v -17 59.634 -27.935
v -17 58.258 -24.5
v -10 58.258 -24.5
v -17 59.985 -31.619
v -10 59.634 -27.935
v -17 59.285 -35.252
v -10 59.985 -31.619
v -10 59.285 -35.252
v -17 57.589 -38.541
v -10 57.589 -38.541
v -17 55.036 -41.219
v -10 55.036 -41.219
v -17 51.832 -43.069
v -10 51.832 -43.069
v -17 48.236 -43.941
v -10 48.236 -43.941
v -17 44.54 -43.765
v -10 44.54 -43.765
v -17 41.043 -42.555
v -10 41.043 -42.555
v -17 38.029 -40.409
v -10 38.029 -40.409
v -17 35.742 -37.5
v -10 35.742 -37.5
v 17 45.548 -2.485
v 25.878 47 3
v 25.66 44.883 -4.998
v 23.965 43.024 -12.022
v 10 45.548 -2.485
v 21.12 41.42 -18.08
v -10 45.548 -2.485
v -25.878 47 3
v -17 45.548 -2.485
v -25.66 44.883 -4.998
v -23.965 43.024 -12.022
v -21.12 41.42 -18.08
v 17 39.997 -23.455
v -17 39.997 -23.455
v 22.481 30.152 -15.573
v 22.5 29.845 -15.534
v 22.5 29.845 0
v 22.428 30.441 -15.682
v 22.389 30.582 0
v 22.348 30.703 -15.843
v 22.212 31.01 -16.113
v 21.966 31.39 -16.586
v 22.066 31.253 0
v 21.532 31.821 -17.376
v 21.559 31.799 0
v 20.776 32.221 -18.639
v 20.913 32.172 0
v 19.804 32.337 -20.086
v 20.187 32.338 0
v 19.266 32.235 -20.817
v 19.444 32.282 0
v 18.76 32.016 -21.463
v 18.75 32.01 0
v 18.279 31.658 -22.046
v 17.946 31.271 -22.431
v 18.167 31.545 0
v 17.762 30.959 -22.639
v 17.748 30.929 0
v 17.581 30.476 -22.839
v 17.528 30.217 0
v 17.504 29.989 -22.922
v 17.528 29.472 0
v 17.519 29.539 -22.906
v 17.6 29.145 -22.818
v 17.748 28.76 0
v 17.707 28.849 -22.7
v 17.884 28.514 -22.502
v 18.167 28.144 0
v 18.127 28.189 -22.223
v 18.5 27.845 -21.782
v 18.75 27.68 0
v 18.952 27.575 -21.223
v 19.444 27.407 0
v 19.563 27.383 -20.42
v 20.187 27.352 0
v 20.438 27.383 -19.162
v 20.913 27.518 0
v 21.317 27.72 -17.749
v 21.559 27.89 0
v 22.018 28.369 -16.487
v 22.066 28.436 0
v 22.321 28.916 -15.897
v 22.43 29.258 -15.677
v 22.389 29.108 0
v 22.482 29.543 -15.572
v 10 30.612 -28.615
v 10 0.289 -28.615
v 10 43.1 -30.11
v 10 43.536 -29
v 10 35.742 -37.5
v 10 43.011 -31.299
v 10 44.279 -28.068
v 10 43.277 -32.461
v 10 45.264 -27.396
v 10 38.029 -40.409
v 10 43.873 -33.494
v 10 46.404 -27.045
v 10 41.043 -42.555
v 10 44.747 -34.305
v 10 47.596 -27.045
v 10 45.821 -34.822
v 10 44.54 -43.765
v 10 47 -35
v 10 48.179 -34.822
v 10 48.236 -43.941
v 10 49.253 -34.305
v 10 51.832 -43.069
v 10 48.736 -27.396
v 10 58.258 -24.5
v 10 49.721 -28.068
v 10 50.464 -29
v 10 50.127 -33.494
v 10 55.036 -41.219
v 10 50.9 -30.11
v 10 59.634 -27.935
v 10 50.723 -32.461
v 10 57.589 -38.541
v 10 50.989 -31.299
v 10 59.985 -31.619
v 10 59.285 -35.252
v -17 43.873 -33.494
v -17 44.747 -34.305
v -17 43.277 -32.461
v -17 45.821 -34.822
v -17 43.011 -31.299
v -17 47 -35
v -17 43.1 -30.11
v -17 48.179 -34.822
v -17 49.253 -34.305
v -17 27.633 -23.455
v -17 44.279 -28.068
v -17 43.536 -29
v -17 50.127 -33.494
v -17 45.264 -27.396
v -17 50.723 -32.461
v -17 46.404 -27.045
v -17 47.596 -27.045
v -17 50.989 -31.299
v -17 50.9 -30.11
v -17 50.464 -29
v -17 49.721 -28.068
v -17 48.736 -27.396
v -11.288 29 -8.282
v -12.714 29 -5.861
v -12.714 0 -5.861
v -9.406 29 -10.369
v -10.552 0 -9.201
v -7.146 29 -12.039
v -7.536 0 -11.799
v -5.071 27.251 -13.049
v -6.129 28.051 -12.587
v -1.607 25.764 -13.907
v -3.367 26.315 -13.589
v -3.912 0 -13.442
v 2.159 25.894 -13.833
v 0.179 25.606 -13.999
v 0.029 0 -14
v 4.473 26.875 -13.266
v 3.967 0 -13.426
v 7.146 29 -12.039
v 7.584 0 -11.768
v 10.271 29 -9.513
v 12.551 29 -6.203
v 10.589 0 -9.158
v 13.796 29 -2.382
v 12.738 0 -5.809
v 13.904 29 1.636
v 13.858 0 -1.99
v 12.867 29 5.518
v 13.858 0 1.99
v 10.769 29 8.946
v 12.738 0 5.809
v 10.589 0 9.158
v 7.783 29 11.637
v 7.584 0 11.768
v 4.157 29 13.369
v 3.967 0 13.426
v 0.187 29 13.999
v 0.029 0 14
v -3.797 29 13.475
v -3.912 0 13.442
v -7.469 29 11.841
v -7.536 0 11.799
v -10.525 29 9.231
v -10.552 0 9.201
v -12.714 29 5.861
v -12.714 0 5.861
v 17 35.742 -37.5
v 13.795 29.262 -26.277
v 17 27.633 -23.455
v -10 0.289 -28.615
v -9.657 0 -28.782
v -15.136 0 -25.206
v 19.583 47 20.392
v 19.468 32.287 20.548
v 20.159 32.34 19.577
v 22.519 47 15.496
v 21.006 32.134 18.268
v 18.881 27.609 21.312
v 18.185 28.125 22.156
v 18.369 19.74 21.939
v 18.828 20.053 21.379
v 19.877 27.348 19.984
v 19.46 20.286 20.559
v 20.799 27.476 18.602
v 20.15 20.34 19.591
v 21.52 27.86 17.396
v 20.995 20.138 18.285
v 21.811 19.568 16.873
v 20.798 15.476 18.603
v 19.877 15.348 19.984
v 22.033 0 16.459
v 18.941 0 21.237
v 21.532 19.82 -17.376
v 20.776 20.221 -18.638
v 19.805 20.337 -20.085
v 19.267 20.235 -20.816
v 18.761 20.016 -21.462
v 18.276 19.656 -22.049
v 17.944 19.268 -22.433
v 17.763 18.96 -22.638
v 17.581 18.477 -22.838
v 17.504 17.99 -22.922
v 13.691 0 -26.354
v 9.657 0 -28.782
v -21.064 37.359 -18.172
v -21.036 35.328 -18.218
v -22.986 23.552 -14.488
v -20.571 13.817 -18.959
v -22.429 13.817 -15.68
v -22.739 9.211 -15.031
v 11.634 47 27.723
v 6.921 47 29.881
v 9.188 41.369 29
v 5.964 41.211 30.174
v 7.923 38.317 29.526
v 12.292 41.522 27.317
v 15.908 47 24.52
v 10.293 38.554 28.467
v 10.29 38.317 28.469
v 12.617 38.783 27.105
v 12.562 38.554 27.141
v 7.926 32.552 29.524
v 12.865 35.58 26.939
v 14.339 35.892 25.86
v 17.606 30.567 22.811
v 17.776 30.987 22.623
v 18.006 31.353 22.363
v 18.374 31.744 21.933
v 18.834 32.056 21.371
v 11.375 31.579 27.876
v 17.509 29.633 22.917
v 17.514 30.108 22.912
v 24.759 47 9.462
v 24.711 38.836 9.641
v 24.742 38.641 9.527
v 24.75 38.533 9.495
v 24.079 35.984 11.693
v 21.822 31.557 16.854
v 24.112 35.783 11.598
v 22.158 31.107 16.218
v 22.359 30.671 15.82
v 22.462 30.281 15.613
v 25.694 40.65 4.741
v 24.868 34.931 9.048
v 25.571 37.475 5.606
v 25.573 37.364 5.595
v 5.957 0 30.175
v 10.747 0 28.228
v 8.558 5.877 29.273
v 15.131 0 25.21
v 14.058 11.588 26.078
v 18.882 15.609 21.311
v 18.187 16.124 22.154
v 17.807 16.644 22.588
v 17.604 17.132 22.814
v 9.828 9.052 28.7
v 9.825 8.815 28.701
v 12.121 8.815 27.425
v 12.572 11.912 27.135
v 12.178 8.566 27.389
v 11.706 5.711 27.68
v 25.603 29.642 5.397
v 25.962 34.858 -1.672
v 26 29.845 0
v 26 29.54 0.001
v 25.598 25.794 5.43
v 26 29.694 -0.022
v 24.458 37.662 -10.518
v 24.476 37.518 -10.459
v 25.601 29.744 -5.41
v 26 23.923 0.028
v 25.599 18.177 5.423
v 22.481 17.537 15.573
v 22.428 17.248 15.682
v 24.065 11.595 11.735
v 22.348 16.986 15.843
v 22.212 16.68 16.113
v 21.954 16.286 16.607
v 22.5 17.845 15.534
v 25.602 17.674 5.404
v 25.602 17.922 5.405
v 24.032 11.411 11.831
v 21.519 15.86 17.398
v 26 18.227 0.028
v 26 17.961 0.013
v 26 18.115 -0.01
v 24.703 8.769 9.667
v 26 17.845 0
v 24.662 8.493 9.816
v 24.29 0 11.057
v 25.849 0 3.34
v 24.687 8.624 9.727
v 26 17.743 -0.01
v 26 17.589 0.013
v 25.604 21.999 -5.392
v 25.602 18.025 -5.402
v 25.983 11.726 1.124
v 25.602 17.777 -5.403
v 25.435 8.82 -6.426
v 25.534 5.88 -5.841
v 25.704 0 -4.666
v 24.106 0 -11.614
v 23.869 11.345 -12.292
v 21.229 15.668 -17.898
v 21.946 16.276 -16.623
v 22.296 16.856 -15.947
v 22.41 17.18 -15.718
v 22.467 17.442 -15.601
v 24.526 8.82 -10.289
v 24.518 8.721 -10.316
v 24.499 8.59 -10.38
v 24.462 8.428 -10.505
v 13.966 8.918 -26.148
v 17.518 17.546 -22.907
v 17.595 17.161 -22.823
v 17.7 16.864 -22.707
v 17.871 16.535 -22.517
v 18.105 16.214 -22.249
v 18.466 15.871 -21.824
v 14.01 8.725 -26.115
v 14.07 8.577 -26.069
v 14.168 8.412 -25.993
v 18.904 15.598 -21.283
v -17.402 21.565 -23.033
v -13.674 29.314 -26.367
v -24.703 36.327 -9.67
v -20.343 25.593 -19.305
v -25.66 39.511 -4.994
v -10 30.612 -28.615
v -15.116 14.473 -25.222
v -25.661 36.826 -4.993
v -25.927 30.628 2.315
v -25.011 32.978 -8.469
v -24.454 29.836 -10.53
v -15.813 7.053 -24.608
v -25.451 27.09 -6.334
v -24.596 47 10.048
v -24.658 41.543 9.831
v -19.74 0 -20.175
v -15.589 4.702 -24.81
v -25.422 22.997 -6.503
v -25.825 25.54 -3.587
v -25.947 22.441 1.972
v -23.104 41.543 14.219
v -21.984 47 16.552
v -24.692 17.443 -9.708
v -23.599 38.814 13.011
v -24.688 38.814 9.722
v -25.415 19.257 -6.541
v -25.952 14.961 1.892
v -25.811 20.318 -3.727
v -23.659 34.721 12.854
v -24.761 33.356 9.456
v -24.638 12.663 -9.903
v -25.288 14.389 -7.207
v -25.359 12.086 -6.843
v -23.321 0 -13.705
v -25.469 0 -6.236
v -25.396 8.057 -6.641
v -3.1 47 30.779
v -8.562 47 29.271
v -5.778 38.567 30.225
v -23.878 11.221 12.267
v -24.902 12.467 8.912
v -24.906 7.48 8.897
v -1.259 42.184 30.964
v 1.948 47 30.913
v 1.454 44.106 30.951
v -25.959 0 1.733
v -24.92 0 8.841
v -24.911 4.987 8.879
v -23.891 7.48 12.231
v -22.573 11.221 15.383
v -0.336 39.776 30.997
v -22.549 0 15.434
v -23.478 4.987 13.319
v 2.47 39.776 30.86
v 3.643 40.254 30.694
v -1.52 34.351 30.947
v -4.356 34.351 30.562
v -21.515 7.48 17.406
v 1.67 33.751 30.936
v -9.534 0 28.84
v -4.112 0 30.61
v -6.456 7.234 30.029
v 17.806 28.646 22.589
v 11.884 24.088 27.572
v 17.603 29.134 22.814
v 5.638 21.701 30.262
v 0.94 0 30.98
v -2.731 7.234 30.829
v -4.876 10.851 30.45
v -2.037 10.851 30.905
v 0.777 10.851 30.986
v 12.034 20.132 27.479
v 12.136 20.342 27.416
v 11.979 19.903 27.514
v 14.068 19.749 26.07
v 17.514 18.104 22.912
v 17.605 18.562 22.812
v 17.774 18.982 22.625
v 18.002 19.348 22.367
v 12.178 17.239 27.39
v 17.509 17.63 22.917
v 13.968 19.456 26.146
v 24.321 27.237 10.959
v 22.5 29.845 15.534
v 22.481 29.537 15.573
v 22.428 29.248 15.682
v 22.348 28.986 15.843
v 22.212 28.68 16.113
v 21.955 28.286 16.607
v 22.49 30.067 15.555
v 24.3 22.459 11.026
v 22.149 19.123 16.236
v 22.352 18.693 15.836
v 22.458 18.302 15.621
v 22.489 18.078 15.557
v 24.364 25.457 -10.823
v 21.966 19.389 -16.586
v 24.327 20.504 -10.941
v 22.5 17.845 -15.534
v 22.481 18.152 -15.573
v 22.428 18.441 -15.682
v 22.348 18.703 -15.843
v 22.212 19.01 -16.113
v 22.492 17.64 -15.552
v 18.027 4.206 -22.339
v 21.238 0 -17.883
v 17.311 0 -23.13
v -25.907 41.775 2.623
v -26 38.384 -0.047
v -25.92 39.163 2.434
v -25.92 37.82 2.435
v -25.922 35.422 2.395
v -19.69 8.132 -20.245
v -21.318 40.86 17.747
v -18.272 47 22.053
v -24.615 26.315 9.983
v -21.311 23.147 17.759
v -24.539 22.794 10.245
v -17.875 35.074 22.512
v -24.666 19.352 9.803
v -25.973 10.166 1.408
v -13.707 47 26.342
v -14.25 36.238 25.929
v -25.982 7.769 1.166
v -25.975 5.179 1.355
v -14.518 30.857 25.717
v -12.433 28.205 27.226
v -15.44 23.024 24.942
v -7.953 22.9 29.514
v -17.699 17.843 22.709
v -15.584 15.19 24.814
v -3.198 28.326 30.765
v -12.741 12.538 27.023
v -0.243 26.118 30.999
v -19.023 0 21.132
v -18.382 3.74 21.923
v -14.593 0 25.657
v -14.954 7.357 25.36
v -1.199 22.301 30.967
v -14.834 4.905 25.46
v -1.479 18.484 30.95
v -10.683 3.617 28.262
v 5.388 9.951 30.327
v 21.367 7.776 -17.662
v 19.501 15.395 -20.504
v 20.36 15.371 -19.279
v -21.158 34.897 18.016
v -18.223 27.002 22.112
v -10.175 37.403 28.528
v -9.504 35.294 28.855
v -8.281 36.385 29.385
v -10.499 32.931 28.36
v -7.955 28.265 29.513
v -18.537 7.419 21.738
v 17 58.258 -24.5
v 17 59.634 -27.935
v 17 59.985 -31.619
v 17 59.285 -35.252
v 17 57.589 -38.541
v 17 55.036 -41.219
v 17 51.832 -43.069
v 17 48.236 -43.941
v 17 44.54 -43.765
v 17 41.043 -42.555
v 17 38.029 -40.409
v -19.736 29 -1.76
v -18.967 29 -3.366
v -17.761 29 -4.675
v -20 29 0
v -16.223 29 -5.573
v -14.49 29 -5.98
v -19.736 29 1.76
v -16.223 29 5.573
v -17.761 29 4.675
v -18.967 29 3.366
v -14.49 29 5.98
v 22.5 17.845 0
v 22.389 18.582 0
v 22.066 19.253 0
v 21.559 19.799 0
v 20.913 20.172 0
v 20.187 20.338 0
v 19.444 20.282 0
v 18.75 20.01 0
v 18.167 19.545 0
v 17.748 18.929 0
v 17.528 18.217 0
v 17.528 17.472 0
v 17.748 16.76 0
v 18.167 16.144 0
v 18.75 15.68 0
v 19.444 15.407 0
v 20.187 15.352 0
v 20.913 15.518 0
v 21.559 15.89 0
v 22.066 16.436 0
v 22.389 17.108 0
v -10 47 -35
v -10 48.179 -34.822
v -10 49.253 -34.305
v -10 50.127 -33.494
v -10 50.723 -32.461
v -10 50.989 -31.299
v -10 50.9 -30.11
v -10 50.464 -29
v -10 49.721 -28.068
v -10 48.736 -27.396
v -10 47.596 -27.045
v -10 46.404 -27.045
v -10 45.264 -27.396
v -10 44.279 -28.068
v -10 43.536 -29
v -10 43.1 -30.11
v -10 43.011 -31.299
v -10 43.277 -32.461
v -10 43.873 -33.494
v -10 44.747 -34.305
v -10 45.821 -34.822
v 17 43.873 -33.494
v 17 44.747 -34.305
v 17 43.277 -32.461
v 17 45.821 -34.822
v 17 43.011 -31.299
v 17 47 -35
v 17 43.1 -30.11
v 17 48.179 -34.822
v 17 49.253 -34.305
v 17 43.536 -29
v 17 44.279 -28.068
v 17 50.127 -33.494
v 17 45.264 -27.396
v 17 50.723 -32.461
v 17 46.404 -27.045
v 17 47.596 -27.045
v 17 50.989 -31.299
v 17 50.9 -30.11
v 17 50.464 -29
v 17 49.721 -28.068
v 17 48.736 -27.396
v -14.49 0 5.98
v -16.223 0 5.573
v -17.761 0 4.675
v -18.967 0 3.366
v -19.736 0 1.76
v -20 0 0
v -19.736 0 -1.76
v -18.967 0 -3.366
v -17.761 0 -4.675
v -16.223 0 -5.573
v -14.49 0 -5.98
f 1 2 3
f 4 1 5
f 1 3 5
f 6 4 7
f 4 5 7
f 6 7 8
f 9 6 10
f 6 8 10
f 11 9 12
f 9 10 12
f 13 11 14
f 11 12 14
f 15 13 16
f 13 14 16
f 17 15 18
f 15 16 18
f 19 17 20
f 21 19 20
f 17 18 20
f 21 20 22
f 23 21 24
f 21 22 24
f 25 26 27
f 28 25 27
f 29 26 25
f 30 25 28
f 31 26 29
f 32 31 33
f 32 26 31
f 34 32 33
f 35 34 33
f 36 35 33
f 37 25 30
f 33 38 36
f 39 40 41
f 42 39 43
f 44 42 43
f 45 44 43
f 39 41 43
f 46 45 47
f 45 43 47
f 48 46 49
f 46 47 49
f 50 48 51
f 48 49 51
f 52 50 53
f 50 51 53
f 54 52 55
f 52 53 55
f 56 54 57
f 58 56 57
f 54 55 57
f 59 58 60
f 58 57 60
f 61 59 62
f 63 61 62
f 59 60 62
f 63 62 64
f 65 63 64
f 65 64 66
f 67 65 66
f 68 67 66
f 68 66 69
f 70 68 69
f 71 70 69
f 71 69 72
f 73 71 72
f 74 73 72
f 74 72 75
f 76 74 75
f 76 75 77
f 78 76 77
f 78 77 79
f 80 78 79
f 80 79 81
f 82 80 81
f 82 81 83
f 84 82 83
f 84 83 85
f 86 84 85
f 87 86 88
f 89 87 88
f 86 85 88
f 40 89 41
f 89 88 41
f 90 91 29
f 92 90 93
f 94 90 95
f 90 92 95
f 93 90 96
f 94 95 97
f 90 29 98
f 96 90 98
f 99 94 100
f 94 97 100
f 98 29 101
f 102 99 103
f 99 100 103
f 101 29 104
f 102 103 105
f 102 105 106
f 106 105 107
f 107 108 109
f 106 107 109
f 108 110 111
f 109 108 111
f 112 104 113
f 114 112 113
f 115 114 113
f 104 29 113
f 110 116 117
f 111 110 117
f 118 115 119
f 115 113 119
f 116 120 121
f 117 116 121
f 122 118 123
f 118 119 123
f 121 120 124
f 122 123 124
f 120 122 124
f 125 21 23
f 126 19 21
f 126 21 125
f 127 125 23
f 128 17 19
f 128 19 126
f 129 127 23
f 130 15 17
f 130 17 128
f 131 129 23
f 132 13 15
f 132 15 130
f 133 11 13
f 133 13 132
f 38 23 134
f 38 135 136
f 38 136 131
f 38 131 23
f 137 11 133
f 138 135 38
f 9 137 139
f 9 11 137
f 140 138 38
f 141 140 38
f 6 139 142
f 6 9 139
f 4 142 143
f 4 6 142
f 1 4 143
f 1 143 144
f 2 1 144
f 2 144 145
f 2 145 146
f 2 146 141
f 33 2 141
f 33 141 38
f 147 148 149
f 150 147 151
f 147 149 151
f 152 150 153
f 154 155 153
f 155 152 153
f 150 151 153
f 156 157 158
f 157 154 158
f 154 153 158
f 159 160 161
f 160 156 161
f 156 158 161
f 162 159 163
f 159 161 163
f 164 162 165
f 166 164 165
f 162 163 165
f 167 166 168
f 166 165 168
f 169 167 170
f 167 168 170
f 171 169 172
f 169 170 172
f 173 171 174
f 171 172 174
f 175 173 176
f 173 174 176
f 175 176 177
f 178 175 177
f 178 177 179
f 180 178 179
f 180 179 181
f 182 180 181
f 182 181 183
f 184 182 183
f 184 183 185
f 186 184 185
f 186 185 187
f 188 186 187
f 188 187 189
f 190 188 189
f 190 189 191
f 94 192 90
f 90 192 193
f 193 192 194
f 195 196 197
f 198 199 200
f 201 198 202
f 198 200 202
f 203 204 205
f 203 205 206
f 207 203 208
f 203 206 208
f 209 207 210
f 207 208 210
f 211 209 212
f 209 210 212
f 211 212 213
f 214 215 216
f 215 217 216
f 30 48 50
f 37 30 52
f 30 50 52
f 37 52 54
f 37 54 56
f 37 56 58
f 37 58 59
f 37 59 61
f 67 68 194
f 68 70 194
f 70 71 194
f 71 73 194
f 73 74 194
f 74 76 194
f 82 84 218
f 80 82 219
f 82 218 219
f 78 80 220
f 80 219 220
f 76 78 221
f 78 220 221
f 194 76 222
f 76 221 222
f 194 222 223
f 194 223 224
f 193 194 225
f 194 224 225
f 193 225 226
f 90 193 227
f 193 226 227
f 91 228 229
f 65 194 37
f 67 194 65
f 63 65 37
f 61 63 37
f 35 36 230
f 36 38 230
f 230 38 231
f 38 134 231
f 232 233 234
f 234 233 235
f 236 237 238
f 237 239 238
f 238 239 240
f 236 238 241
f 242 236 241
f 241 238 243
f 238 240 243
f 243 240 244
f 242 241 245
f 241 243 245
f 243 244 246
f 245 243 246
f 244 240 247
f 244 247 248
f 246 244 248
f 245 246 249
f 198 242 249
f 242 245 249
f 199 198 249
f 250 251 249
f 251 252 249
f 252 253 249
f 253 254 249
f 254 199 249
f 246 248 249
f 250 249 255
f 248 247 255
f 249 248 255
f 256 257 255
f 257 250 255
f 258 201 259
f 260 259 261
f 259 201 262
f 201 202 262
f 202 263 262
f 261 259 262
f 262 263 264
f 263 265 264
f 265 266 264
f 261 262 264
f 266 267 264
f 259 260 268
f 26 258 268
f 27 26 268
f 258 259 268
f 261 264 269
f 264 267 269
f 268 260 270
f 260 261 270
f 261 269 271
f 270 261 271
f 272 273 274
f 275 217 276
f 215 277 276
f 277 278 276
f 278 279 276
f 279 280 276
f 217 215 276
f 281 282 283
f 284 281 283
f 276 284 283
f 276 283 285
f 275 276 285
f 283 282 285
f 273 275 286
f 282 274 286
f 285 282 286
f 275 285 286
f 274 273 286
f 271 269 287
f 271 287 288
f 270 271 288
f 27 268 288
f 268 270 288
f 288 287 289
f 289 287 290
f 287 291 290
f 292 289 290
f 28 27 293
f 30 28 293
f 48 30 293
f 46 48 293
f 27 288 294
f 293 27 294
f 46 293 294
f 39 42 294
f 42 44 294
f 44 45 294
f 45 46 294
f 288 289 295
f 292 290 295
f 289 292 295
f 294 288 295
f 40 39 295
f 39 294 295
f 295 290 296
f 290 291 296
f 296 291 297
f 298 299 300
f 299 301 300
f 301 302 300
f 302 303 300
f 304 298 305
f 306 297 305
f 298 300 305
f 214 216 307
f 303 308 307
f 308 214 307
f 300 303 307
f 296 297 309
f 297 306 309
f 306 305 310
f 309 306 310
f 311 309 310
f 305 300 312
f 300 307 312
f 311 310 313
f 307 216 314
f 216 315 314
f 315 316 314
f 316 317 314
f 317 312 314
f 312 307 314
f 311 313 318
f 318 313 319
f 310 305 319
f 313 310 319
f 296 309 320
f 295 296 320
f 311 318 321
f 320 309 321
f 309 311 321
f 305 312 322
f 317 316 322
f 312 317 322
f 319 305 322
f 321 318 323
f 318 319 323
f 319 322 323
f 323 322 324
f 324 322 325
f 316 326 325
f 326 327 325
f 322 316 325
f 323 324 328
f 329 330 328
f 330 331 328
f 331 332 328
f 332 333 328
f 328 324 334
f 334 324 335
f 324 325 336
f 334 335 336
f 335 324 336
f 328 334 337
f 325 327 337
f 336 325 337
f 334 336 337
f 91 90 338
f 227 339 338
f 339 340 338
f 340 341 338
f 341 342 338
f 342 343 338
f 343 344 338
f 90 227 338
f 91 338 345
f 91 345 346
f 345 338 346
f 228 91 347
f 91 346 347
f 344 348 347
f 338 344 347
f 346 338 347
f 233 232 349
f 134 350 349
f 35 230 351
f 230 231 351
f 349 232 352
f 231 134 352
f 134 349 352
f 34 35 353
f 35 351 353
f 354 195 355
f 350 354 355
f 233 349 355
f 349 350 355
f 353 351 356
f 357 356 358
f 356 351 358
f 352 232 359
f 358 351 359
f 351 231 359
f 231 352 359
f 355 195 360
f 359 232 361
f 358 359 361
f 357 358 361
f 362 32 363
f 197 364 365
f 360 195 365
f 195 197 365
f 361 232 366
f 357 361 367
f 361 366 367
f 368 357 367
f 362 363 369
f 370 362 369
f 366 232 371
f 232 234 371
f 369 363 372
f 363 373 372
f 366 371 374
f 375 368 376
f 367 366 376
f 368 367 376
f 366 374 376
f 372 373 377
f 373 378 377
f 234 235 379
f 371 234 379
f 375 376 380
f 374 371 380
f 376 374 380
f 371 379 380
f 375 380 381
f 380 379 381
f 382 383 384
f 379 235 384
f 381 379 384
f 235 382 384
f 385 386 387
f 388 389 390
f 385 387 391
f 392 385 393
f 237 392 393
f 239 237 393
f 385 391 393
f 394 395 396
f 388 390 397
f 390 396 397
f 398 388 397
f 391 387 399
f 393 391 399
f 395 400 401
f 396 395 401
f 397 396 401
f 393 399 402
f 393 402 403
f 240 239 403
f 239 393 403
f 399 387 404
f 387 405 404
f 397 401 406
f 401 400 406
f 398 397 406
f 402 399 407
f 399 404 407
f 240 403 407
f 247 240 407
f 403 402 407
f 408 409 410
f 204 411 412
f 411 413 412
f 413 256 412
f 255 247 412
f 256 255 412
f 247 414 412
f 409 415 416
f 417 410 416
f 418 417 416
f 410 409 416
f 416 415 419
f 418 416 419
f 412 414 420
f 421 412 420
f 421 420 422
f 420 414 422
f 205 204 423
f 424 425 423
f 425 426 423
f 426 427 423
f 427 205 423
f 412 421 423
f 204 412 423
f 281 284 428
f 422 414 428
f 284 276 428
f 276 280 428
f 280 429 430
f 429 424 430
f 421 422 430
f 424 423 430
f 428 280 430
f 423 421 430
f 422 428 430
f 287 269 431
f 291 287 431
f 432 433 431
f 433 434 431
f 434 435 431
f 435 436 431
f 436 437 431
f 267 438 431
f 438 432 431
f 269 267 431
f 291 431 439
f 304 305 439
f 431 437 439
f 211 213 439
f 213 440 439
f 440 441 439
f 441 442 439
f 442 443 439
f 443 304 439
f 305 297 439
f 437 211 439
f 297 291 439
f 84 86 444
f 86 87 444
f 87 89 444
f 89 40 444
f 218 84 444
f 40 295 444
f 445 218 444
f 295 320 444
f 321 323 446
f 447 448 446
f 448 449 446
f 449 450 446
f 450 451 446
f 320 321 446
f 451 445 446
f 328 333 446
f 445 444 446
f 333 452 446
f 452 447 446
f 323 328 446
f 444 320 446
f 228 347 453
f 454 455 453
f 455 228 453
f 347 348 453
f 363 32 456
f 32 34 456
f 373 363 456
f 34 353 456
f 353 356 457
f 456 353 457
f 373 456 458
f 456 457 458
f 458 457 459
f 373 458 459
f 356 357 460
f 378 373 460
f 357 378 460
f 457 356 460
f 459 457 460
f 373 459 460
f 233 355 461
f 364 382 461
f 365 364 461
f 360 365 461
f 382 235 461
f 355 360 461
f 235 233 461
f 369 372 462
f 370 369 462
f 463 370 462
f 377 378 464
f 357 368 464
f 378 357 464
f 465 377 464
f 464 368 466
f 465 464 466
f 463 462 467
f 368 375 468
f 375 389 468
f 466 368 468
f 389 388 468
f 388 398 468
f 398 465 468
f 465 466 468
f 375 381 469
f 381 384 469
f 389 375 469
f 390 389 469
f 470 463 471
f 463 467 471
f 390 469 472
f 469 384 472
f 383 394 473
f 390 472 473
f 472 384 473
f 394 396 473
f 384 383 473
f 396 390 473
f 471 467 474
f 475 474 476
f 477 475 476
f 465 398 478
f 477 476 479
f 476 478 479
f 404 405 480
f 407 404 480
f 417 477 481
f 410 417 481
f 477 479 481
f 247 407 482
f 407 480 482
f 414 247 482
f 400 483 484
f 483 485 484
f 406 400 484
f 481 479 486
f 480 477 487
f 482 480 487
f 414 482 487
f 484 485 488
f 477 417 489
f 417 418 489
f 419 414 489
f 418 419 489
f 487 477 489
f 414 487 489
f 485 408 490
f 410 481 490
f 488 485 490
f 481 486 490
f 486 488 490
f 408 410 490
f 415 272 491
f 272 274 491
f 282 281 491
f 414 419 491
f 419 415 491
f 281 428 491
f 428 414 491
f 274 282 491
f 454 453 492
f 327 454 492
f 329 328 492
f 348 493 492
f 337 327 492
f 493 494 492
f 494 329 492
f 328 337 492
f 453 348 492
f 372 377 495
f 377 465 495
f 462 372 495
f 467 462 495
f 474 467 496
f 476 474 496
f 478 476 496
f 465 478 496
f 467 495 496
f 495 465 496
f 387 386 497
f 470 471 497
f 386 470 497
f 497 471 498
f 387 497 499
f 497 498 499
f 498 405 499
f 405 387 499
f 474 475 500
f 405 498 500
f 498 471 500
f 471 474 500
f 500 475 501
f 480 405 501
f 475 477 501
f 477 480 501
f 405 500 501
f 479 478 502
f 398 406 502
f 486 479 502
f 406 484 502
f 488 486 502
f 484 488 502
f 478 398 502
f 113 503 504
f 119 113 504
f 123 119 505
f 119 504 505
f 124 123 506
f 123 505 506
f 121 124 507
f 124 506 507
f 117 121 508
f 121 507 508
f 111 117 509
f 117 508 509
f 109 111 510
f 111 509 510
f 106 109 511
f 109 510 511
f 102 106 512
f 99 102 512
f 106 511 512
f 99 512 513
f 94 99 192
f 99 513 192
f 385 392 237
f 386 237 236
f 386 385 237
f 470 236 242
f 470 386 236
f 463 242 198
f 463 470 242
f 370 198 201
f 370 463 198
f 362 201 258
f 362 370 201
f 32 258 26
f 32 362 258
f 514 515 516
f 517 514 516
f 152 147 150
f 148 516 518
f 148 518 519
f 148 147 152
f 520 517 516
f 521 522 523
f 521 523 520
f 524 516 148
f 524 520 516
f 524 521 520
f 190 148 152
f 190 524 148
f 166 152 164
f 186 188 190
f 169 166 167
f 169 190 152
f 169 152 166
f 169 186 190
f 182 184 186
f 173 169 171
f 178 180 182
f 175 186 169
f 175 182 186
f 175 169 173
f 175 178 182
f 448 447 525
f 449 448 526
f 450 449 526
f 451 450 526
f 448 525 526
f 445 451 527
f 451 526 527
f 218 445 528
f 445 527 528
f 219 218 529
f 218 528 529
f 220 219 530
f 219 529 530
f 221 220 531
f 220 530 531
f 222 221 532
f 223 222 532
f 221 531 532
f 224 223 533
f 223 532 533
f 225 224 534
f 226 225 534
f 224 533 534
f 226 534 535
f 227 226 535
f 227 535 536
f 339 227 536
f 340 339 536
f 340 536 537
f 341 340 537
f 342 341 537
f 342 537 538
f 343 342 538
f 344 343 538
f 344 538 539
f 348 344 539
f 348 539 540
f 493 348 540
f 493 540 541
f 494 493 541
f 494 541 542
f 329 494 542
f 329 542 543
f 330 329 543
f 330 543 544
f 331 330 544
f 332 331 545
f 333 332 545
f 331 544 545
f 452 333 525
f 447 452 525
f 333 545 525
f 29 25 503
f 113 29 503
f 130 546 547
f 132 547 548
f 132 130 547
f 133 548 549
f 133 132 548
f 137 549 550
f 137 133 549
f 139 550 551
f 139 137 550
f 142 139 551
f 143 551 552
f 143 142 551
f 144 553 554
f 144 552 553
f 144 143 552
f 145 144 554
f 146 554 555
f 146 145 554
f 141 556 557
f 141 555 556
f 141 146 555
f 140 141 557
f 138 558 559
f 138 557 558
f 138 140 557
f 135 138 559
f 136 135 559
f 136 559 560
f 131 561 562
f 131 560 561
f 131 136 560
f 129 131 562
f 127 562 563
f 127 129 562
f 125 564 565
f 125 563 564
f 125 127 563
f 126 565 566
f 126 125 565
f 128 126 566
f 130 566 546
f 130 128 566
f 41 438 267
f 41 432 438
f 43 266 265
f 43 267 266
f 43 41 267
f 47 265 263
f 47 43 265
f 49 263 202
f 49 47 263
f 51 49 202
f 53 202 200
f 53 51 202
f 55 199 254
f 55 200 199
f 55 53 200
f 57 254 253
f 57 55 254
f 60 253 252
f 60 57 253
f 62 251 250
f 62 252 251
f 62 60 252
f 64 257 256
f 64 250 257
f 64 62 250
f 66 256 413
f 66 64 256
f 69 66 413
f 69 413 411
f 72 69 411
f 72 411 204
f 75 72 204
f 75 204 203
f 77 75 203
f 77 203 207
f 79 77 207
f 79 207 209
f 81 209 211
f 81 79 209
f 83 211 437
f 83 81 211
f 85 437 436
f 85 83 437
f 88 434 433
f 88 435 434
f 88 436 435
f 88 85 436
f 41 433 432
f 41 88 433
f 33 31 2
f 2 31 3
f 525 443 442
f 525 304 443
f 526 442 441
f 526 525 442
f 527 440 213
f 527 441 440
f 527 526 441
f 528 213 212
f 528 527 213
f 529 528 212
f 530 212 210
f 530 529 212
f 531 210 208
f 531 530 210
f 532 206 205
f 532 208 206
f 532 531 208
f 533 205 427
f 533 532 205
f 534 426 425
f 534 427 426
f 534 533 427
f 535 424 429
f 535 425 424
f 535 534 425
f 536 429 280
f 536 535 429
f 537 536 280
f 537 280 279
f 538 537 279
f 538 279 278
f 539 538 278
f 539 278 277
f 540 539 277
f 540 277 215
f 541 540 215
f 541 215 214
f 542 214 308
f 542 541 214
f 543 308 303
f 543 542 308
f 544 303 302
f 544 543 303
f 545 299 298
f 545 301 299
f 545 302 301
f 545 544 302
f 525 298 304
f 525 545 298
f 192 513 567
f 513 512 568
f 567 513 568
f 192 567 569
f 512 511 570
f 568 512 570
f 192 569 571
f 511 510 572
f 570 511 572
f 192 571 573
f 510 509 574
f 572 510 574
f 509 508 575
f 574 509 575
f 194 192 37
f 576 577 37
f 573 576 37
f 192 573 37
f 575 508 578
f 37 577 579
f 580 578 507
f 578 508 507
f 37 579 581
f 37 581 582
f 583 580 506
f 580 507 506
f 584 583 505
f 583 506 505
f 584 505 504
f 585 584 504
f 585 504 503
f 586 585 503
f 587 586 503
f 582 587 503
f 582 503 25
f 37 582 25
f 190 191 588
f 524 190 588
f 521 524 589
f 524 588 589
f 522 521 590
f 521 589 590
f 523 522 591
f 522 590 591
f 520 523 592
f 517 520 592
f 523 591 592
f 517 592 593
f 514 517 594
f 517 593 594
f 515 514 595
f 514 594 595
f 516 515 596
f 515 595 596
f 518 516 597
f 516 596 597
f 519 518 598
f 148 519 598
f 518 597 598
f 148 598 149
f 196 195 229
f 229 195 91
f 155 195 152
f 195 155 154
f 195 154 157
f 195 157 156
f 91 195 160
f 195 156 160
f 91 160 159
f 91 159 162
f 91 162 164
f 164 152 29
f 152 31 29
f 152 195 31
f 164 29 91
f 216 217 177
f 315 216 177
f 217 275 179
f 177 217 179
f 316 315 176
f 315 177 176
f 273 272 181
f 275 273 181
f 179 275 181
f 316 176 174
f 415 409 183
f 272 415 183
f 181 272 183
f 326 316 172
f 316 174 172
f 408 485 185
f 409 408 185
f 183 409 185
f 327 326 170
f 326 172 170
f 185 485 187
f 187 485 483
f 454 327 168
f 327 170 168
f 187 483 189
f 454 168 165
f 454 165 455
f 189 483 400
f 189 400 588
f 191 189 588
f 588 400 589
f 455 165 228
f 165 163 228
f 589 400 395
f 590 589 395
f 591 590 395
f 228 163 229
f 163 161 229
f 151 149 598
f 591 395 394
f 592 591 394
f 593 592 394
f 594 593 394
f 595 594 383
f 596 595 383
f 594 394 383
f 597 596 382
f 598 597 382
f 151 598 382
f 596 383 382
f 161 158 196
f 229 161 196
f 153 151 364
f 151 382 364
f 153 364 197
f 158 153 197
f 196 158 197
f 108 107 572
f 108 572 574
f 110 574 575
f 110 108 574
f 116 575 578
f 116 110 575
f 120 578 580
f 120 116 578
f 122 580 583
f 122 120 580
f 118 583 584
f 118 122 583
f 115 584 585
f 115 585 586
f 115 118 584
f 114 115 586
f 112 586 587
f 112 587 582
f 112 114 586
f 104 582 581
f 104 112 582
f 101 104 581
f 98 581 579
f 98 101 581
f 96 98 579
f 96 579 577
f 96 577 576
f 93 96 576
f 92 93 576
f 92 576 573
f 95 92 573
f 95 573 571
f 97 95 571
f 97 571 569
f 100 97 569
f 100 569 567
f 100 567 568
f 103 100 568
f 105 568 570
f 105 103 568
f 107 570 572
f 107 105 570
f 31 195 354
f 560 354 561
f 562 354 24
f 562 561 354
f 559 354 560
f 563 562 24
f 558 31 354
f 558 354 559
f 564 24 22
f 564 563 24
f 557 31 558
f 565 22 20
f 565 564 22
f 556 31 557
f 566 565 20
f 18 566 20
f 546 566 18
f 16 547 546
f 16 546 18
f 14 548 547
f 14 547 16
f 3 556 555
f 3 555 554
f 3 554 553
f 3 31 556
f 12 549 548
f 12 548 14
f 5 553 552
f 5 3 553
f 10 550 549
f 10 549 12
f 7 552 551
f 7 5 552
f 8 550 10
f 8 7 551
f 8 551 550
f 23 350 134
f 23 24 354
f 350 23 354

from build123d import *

# Parameters (mm, degrees)
SKETCH2_RX              = 31
SKETCH2_RY              = 26
BOSS_EXTRUDE1_DEPTH     = 47
CUT_EXTRUDE1_DEPTH      = 29
CUT_EXTRUDE2_DEPTH      = 27
CUT_EXTRUDE2_DEPTH_BACK = 27
SKETCH5_R               = 4
BOSS_EXTRUDE2_DEPTH     = 17
SKETCH6_W               = 20
SKETCH6_H               = 38.42056209
CUT_EXTRUDE3_DEPTH      = 61.203194114
SKETCH7_R               = 2.5
CUT_EXTRUDE4_DEPTH      = 32.0000001
CUT_EXTRUDE4_DEPTH_BACK = 45.0000001


with BuildPart() as part:
    # Sketch2 → Boss-Extrude1 (new body)
    with BuildSketch(Plane(origin=(0, 0, 0), x_dir=(1, 0, 0), z_dir=(0, 1, 0))):
        with Locations(Location((0, 0), (0, 0, 90))):
            Ellipse(SKETCH2_RX, SKETCH2_RY)
    extrude(amount=BOSS_EXTRUDE1_DEPTH)

    # Sketch3 → Cut-Extrude1 (cut)
    with BuildSketch(Plane.XZ):
        with BuildLine():
            ThreePointArc((-12.714285714, -5.860626142), (14, 0), (-12.714285714, 5.860626142))
            ThreePointArc((-12.714285714, 5.860626142), (-20, 0), (-12.714285714, -5.860626142))
        make_face()
    extrude(amount=-CUT_EXTRUDE1_DEPTH, mode=Mode.SUBTRACT)

    # Sketch4 → Cut-Extrude2 (cut, two sides)
    with BuildSketch(Plane(origin=(0, 0, 0), x_dir=(0, 0, -1), z_dir=(1, 0, 0))) as cut_extrude2_sk:
        Polygon((-3, 47), (31, 38), (31, 47), align=None)
    extrude(amount=CUT_EXTRUDE2_DEPTH, mode=Mode.SUBTRACT)
    extrude(cut_extrude2_sk.sketch, amount=-CUT_EXTRUDE2_DEPTH_BACK, mode=Mode.SUBTRACT)

    # Sketch5 → Boss-Extrude2 (add, symmetric)
    with BuildSketch(Plane(origin=(0, 0, 0), x_dir=(0, 0, -1), z_dir=(1, 0, 0))):
        with BuildLine():
            Line((2.485147451, 45.548049204), (24.5, 58.258330249))
            ThreePointArc((24.5, 58.258330249), (42.258330249, 53.5), (37.5, 35.741669751))
            Line((37.5, 35.741669751), (15.485147451, 23.031388706))
            Line((15.485147451, 23.031388706), (2.485147451, 45.548049204))
        make_face()
        with Locations((31, 47)):
            Circle(SKETCH5_R, mode=Mode.SUBTRACT)
    extrude(amount=BOSS_EXTRUDE2_DEPTH, both=True)

    # Sketch6 → Cut-Extrude3 (cut, through all)
    with BuildSketch(Plane(origin=(0, 33.084936491, 19.101596989), x_dir=(1, 0, 0), z_dir=(0, 0.866025404, 0.5))):
        with Locations((0, 44.136506472)):
            Rectangle(SKETCH6_W, SKETCH6_H)
    extrude(amount=-CUT_EXTRUDE3_DEPTH, mode=Mode.SUBTRACT)

    # Sketch7 → Cut-Extrude4 (cut, two sides)
    with BuildSketch(Plane.XY) as cut_extrude4_sk:
        with Locations((20, 29.844780472)):
            Circle(SKETCH7_R)
        with Locations((20, 17.844780472)):
            Circle(SKETCH7_R)
    extrude(amount=CUT_EXTRUDE4_DEPTH, mode=Mode.SUBTRACT)
    extrude(cut_extrude4_sk.sketch, amount=-CUT_EXTRUDE4_DEPTH_BACK, mode=Mode.SUBTRACT)


solid = part.part
